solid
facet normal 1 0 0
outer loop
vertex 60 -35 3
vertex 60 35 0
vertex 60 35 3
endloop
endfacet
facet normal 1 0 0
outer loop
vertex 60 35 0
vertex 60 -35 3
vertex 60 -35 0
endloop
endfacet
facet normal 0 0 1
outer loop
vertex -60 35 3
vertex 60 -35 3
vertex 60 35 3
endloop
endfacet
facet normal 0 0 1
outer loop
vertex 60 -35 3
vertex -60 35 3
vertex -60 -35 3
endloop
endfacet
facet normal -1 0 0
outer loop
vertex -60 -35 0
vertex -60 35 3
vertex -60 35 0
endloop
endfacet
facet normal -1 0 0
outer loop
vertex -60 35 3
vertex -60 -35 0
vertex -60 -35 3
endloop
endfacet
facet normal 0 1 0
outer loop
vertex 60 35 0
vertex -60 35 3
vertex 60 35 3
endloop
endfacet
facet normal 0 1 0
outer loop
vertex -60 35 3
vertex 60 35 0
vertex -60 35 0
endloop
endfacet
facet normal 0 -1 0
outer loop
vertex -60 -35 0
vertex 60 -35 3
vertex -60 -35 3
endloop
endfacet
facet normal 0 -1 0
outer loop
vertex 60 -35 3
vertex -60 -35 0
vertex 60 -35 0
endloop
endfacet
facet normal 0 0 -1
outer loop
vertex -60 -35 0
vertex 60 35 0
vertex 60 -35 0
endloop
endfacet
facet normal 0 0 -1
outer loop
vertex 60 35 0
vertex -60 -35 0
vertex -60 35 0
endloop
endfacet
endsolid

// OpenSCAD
// Built by bench/smallmodels/features/compiler.py from a list of features.
$fn = 64;
difference() {
  union() {
    translate([0, 0, 0]) translate([-60, -35, 0]) cube([120, 70, 40]);
  }
  union() {
    translate([0, 0, 3]) rotate([0, 0, 0]) translate([-60, -35, 0]) cube([120, 70, 37]);
    translate([-15, -8, 13]) rotate([0, 0, 0]) translate([-57, -32, 0]) cube([114, 64, 10]);
  }
}
